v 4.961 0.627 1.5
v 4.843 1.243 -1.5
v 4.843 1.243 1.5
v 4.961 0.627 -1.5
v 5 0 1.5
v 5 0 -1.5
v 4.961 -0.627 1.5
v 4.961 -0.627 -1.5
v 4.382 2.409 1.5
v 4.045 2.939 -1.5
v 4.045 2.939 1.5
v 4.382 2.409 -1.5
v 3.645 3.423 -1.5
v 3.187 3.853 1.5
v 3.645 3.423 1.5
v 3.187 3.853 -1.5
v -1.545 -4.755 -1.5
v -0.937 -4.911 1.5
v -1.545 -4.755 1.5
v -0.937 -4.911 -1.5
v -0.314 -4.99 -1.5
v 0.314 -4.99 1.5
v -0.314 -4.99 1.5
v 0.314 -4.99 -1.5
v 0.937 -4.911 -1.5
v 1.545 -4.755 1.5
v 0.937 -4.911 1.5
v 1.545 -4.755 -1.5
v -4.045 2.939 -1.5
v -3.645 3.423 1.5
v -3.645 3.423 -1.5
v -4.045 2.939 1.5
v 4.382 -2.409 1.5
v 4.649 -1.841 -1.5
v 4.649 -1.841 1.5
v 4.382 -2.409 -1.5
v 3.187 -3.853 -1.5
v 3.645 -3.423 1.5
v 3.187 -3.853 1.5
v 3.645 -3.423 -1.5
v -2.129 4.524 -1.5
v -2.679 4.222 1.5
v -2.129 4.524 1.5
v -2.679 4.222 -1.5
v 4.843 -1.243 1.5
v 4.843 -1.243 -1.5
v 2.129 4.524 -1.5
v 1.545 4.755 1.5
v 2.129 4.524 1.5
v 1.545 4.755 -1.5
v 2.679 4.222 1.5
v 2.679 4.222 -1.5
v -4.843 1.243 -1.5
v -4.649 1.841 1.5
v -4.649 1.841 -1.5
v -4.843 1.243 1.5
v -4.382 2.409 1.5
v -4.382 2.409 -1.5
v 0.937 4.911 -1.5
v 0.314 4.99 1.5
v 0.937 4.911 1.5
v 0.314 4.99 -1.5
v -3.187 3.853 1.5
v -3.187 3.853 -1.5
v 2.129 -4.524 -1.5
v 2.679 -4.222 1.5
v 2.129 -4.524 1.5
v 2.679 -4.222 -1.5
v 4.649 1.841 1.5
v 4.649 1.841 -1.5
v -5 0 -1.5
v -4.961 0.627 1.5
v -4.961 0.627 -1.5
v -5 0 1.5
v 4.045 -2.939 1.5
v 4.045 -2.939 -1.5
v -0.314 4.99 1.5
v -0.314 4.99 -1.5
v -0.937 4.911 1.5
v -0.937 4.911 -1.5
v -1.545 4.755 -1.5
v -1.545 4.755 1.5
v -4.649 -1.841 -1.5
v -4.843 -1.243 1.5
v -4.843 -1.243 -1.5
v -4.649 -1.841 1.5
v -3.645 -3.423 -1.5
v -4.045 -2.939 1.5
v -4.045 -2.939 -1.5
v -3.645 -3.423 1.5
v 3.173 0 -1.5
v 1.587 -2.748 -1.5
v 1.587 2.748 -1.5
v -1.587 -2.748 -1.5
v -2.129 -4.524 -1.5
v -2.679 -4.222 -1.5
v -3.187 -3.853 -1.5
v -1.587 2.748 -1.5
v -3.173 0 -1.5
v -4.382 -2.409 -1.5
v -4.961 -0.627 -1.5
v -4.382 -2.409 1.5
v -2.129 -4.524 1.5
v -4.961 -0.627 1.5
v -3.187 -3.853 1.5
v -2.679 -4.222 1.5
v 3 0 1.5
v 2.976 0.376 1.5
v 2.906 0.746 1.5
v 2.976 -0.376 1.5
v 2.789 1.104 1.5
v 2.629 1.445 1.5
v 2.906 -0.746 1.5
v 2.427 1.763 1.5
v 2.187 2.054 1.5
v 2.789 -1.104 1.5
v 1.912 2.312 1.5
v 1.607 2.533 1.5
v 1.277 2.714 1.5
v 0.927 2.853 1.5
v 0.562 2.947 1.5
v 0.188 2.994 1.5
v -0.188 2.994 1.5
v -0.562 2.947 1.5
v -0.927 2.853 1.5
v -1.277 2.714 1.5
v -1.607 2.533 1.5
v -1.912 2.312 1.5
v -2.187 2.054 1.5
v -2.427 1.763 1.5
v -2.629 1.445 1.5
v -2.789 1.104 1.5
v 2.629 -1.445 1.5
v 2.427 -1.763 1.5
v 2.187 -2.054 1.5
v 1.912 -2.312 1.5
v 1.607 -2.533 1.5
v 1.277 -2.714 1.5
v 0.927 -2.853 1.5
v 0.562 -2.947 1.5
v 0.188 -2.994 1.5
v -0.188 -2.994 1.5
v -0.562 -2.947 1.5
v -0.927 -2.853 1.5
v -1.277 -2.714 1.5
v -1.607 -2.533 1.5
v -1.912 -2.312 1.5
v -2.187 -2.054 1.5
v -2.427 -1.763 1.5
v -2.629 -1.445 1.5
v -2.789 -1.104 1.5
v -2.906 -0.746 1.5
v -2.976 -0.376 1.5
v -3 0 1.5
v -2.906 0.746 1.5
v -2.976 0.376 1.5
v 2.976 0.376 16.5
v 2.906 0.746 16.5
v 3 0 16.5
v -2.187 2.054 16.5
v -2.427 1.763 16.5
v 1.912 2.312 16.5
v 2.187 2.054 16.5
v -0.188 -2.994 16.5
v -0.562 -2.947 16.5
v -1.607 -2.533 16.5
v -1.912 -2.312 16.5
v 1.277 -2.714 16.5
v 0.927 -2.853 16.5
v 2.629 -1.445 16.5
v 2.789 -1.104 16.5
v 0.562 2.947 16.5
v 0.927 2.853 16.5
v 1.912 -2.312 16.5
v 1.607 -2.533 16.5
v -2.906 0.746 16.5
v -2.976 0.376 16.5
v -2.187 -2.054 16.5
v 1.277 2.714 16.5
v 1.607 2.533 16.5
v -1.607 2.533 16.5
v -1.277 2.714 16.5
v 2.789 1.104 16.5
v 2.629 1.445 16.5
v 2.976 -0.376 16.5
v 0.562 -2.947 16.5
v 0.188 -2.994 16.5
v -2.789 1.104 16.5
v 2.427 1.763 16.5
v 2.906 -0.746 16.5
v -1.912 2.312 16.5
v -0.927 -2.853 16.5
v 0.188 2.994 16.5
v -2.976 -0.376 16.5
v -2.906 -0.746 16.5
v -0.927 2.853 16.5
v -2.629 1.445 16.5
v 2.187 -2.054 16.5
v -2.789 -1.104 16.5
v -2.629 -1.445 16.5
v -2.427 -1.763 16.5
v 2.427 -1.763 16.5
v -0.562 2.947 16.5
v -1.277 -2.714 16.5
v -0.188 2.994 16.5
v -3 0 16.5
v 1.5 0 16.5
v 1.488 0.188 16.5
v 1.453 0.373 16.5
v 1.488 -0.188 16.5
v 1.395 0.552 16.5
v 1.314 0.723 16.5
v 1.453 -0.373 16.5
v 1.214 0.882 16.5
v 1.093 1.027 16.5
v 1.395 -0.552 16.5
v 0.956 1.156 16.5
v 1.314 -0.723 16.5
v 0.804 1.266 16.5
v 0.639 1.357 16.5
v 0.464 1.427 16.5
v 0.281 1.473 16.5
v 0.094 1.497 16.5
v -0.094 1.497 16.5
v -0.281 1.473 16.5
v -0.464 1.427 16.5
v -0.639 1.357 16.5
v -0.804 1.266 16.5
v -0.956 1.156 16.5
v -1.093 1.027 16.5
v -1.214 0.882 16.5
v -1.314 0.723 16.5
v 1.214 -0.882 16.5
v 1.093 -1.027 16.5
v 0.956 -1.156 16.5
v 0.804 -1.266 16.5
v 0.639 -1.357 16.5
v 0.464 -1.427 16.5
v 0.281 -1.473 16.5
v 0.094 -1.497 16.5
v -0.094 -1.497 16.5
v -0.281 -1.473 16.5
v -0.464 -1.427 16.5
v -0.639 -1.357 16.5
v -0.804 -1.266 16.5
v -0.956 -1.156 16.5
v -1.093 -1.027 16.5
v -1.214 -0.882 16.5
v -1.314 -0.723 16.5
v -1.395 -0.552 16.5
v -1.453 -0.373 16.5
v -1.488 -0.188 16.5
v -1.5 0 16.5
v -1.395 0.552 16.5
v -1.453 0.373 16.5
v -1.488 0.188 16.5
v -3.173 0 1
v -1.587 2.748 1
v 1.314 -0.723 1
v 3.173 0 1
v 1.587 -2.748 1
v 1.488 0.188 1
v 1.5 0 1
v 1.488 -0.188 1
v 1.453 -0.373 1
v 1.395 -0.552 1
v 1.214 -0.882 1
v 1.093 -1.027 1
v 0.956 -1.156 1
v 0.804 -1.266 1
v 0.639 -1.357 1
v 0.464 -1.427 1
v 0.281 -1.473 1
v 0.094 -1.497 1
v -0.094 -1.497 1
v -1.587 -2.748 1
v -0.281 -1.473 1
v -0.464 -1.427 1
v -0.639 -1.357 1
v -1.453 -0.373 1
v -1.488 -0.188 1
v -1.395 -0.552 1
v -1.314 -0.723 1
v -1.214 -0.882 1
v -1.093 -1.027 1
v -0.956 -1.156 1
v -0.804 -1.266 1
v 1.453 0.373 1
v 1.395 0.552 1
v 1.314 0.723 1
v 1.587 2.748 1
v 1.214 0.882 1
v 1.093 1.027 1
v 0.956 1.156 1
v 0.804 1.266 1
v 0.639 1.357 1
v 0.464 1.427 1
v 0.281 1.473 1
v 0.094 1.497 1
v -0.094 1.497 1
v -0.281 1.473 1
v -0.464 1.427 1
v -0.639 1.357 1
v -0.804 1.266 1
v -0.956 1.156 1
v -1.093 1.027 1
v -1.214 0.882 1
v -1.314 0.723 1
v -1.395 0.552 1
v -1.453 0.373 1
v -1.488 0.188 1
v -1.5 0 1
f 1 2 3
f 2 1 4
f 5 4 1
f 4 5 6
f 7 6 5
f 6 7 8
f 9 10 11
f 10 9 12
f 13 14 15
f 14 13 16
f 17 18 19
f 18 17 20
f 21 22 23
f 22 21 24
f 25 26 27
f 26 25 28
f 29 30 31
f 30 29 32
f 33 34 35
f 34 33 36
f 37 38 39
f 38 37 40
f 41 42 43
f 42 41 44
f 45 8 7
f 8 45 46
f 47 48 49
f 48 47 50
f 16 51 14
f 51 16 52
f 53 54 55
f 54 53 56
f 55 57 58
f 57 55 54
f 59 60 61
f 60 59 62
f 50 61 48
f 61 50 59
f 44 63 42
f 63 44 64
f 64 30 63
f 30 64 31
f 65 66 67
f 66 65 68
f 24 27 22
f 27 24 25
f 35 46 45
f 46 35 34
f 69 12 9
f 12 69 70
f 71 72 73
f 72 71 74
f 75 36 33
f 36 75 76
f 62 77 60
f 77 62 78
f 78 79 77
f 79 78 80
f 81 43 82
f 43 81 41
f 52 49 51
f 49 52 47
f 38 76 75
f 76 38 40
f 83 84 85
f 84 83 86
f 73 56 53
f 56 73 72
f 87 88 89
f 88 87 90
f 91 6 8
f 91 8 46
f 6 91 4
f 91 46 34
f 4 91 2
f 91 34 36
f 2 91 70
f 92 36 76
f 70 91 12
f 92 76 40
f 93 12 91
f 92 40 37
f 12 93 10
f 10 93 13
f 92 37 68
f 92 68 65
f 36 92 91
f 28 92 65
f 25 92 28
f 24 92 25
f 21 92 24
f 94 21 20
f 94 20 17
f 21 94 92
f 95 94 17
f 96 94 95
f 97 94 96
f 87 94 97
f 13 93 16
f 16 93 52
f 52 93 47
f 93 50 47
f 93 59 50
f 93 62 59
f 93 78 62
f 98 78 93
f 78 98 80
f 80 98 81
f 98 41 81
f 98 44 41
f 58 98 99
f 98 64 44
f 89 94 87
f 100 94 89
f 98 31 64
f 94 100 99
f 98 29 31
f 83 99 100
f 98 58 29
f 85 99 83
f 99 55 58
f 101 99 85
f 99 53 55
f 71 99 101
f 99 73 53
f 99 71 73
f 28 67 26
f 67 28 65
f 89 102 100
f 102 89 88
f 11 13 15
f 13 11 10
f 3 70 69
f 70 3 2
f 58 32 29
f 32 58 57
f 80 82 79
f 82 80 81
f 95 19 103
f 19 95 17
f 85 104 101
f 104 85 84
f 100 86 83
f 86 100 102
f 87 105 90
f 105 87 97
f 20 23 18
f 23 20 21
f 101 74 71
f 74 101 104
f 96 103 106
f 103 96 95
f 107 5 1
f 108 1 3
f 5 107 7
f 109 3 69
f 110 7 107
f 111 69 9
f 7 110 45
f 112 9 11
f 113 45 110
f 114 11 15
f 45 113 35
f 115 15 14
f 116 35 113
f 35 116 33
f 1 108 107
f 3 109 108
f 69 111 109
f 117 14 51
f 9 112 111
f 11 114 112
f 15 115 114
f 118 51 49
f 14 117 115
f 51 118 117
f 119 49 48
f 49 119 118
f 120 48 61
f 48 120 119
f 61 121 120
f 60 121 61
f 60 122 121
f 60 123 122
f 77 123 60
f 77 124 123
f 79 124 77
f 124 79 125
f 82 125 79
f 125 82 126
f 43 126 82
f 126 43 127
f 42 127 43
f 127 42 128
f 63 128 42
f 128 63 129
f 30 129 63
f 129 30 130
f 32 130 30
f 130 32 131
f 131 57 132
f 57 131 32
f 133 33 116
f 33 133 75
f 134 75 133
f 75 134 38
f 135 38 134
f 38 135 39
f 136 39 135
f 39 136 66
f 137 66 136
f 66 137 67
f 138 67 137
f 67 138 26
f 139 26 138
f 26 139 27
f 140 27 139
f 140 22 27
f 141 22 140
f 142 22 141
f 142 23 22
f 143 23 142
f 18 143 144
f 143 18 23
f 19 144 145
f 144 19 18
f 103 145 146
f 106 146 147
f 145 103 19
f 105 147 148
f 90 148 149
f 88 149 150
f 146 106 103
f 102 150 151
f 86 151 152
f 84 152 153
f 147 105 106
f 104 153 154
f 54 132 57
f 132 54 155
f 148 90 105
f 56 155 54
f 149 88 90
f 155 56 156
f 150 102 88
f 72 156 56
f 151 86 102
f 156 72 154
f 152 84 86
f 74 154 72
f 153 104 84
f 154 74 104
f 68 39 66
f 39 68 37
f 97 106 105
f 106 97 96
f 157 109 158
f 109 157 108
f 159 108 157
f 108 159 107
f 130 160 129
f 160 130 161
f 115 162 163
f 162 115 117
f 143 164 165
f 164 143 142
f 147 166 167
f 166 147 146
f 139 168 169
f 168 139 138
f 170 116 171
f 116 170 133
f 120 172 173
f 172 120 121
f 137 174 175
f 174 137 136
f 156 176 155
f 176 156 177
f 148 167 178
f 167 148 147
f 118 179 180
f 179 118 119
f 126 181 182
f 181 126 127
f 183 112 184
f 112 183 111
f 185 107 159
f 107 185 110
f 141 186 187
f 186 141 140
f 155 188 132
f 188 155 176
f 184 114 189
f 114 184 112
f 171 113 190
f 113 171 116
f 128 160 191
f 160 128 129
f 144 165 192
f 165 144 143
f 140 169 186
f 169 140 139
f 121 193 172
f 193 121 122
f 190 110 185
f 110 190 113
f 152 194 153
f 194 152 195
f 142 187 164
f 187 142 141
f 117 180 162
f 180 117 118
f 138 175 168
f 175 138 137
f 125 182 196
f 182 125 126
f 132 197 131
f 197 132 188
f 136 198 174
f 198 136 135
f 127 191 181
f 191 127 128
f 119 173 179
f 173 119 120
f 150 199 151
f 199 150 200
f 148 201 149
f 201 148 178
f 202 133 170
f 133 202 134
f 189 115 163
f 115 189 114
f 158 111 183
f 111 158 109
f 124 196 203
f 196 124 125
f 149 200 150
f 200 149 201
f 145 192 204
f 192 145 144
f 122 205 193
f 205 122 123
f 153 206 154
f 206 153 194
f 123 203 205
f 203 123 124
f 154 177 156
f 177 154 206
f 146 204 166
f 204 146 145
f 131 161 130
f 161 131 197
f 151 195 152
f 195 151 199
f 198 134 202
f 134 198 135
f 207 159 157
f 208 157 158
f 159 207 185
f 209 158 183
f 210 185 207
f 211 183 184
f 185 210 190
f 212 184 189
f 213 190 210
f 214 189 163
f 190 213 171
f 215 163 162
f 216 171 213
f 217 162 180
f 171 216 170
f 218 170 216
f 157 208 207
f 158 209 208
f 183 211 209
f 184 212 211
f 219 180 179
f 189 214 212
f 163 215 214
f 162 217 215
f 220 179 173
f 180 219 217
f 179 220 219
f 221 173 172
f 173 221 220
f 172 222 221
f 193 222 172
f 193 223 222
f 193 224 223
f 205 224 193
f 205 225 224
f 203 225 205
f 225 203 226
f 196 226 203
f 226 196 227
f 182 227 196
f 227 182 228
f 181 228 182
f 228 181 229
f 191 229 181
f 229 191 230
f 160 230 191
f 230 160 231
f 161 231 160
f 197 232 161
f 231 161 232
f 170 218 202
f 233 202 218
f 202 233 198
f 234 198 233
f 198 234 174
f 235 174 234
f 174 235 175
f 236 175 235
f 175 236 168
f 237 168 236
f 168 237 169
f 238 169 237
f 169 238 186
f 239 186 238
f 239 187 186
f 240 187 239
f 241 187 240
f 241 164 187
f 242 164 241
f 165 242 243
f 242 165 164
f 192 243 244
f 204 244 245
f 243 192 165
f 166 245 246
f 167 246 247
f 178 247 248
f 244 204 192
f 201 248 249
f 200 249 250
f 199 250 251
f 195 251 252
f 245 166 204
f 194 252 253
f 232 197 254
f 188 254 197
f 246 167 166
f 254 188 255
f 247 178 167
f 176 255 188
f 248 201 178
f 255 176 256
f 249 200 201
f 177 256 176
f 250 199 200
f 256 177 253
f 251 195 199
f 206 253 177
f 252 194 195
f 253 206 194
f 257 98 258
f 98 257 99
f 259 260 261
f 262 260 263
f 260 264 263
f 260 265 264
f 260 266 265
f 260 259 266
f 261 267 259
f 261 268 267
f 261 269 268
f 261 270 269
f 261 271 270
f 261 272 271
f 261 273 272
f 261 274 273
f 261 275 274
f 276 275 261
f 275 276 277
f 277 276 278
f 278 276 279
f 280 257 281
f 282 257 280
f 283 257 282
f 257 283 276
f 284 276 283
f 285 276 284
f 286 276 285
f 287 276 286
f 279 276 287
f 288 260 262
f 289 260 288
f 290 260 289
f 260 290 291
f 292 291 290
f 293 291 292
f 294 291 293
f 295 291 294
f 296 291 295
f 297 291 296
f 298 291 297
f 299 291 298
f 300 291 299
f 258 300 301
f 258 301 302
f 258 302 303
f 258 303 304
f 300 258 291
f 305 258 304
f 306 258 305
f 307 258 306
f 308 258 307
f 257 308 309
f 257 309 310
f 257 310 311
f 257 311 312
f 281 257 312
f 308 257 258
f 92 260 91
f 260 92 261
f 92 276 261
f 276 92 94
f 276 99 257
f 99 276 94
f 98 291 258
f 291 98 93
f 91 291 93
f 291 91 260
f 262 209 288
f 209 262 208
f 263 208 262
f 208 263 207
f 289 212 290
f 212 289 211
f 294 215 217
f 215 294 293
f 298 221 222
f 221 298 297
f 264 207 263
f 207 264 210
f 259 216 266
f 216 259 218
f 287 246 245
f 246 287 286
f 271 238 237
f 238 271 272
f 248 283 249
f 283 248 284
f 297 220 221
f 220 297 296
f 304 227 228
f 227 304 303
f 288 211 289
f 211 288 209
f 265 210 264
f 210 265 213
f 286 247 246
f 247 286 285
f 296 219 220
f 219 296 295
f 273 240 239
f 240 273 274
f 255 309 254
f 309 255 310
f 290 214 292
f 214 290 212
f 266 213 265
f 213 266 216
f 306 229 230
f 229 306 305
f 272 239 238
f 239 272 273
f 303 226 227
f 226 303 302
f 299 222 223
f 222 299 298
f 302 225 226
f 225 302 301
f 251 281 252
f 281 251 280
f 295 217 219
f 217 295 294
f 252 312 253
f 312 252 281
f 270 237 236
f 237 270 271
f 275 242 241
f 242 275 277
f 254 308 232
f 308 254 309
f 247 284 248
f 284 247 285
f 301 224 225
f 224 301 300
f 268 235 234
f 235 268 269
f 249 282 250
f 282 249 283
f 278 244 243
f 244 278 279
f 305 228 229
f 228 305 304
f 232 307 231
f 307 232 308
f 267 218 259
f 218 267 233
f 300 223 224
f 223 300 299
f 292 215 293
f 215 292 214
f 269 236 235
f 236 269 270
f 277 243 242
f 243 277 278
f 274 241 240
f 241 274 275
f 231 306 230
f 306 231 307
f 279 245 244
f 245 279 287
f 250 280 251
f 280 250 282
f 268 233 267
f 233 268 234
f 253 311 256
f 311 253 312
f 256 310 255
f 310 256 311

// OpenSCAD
$fn = 50;


difference() {
	union() {
		translate(v = [0, 0, -1.5000000000]) {
			cylinder(h = 3, r = 5.0000000000);
		}
		translate(v = [0, 0, -1.5000000000]) {
			cylinder(h = 18, r = 3.0000000000);
		}
	}
	union() {
		translate(v = [0, 0, -1.5000000000]) {
			rotate(a = [0, 0, 0]) {
				difference() {
					union() {
						linear_extrude(height = 2.5000000000) {
							polygon(points = [[3.1735000000, 0.0000000000], [1.5867500000, 2.7483316189], [-1.5867500000, 2.7483316189], [-3.1735000000, 0.0000000000], [-1.5867500000, -2.7483316189], [1.5867500000, -2.7483316189]]);
						}
					}
					union();
				}
			}
		}
		translate(v = [0, 0, -100.0000000000]) {
			cylinder(h = 200, r = 1.5000000000);
		}
	}
}
